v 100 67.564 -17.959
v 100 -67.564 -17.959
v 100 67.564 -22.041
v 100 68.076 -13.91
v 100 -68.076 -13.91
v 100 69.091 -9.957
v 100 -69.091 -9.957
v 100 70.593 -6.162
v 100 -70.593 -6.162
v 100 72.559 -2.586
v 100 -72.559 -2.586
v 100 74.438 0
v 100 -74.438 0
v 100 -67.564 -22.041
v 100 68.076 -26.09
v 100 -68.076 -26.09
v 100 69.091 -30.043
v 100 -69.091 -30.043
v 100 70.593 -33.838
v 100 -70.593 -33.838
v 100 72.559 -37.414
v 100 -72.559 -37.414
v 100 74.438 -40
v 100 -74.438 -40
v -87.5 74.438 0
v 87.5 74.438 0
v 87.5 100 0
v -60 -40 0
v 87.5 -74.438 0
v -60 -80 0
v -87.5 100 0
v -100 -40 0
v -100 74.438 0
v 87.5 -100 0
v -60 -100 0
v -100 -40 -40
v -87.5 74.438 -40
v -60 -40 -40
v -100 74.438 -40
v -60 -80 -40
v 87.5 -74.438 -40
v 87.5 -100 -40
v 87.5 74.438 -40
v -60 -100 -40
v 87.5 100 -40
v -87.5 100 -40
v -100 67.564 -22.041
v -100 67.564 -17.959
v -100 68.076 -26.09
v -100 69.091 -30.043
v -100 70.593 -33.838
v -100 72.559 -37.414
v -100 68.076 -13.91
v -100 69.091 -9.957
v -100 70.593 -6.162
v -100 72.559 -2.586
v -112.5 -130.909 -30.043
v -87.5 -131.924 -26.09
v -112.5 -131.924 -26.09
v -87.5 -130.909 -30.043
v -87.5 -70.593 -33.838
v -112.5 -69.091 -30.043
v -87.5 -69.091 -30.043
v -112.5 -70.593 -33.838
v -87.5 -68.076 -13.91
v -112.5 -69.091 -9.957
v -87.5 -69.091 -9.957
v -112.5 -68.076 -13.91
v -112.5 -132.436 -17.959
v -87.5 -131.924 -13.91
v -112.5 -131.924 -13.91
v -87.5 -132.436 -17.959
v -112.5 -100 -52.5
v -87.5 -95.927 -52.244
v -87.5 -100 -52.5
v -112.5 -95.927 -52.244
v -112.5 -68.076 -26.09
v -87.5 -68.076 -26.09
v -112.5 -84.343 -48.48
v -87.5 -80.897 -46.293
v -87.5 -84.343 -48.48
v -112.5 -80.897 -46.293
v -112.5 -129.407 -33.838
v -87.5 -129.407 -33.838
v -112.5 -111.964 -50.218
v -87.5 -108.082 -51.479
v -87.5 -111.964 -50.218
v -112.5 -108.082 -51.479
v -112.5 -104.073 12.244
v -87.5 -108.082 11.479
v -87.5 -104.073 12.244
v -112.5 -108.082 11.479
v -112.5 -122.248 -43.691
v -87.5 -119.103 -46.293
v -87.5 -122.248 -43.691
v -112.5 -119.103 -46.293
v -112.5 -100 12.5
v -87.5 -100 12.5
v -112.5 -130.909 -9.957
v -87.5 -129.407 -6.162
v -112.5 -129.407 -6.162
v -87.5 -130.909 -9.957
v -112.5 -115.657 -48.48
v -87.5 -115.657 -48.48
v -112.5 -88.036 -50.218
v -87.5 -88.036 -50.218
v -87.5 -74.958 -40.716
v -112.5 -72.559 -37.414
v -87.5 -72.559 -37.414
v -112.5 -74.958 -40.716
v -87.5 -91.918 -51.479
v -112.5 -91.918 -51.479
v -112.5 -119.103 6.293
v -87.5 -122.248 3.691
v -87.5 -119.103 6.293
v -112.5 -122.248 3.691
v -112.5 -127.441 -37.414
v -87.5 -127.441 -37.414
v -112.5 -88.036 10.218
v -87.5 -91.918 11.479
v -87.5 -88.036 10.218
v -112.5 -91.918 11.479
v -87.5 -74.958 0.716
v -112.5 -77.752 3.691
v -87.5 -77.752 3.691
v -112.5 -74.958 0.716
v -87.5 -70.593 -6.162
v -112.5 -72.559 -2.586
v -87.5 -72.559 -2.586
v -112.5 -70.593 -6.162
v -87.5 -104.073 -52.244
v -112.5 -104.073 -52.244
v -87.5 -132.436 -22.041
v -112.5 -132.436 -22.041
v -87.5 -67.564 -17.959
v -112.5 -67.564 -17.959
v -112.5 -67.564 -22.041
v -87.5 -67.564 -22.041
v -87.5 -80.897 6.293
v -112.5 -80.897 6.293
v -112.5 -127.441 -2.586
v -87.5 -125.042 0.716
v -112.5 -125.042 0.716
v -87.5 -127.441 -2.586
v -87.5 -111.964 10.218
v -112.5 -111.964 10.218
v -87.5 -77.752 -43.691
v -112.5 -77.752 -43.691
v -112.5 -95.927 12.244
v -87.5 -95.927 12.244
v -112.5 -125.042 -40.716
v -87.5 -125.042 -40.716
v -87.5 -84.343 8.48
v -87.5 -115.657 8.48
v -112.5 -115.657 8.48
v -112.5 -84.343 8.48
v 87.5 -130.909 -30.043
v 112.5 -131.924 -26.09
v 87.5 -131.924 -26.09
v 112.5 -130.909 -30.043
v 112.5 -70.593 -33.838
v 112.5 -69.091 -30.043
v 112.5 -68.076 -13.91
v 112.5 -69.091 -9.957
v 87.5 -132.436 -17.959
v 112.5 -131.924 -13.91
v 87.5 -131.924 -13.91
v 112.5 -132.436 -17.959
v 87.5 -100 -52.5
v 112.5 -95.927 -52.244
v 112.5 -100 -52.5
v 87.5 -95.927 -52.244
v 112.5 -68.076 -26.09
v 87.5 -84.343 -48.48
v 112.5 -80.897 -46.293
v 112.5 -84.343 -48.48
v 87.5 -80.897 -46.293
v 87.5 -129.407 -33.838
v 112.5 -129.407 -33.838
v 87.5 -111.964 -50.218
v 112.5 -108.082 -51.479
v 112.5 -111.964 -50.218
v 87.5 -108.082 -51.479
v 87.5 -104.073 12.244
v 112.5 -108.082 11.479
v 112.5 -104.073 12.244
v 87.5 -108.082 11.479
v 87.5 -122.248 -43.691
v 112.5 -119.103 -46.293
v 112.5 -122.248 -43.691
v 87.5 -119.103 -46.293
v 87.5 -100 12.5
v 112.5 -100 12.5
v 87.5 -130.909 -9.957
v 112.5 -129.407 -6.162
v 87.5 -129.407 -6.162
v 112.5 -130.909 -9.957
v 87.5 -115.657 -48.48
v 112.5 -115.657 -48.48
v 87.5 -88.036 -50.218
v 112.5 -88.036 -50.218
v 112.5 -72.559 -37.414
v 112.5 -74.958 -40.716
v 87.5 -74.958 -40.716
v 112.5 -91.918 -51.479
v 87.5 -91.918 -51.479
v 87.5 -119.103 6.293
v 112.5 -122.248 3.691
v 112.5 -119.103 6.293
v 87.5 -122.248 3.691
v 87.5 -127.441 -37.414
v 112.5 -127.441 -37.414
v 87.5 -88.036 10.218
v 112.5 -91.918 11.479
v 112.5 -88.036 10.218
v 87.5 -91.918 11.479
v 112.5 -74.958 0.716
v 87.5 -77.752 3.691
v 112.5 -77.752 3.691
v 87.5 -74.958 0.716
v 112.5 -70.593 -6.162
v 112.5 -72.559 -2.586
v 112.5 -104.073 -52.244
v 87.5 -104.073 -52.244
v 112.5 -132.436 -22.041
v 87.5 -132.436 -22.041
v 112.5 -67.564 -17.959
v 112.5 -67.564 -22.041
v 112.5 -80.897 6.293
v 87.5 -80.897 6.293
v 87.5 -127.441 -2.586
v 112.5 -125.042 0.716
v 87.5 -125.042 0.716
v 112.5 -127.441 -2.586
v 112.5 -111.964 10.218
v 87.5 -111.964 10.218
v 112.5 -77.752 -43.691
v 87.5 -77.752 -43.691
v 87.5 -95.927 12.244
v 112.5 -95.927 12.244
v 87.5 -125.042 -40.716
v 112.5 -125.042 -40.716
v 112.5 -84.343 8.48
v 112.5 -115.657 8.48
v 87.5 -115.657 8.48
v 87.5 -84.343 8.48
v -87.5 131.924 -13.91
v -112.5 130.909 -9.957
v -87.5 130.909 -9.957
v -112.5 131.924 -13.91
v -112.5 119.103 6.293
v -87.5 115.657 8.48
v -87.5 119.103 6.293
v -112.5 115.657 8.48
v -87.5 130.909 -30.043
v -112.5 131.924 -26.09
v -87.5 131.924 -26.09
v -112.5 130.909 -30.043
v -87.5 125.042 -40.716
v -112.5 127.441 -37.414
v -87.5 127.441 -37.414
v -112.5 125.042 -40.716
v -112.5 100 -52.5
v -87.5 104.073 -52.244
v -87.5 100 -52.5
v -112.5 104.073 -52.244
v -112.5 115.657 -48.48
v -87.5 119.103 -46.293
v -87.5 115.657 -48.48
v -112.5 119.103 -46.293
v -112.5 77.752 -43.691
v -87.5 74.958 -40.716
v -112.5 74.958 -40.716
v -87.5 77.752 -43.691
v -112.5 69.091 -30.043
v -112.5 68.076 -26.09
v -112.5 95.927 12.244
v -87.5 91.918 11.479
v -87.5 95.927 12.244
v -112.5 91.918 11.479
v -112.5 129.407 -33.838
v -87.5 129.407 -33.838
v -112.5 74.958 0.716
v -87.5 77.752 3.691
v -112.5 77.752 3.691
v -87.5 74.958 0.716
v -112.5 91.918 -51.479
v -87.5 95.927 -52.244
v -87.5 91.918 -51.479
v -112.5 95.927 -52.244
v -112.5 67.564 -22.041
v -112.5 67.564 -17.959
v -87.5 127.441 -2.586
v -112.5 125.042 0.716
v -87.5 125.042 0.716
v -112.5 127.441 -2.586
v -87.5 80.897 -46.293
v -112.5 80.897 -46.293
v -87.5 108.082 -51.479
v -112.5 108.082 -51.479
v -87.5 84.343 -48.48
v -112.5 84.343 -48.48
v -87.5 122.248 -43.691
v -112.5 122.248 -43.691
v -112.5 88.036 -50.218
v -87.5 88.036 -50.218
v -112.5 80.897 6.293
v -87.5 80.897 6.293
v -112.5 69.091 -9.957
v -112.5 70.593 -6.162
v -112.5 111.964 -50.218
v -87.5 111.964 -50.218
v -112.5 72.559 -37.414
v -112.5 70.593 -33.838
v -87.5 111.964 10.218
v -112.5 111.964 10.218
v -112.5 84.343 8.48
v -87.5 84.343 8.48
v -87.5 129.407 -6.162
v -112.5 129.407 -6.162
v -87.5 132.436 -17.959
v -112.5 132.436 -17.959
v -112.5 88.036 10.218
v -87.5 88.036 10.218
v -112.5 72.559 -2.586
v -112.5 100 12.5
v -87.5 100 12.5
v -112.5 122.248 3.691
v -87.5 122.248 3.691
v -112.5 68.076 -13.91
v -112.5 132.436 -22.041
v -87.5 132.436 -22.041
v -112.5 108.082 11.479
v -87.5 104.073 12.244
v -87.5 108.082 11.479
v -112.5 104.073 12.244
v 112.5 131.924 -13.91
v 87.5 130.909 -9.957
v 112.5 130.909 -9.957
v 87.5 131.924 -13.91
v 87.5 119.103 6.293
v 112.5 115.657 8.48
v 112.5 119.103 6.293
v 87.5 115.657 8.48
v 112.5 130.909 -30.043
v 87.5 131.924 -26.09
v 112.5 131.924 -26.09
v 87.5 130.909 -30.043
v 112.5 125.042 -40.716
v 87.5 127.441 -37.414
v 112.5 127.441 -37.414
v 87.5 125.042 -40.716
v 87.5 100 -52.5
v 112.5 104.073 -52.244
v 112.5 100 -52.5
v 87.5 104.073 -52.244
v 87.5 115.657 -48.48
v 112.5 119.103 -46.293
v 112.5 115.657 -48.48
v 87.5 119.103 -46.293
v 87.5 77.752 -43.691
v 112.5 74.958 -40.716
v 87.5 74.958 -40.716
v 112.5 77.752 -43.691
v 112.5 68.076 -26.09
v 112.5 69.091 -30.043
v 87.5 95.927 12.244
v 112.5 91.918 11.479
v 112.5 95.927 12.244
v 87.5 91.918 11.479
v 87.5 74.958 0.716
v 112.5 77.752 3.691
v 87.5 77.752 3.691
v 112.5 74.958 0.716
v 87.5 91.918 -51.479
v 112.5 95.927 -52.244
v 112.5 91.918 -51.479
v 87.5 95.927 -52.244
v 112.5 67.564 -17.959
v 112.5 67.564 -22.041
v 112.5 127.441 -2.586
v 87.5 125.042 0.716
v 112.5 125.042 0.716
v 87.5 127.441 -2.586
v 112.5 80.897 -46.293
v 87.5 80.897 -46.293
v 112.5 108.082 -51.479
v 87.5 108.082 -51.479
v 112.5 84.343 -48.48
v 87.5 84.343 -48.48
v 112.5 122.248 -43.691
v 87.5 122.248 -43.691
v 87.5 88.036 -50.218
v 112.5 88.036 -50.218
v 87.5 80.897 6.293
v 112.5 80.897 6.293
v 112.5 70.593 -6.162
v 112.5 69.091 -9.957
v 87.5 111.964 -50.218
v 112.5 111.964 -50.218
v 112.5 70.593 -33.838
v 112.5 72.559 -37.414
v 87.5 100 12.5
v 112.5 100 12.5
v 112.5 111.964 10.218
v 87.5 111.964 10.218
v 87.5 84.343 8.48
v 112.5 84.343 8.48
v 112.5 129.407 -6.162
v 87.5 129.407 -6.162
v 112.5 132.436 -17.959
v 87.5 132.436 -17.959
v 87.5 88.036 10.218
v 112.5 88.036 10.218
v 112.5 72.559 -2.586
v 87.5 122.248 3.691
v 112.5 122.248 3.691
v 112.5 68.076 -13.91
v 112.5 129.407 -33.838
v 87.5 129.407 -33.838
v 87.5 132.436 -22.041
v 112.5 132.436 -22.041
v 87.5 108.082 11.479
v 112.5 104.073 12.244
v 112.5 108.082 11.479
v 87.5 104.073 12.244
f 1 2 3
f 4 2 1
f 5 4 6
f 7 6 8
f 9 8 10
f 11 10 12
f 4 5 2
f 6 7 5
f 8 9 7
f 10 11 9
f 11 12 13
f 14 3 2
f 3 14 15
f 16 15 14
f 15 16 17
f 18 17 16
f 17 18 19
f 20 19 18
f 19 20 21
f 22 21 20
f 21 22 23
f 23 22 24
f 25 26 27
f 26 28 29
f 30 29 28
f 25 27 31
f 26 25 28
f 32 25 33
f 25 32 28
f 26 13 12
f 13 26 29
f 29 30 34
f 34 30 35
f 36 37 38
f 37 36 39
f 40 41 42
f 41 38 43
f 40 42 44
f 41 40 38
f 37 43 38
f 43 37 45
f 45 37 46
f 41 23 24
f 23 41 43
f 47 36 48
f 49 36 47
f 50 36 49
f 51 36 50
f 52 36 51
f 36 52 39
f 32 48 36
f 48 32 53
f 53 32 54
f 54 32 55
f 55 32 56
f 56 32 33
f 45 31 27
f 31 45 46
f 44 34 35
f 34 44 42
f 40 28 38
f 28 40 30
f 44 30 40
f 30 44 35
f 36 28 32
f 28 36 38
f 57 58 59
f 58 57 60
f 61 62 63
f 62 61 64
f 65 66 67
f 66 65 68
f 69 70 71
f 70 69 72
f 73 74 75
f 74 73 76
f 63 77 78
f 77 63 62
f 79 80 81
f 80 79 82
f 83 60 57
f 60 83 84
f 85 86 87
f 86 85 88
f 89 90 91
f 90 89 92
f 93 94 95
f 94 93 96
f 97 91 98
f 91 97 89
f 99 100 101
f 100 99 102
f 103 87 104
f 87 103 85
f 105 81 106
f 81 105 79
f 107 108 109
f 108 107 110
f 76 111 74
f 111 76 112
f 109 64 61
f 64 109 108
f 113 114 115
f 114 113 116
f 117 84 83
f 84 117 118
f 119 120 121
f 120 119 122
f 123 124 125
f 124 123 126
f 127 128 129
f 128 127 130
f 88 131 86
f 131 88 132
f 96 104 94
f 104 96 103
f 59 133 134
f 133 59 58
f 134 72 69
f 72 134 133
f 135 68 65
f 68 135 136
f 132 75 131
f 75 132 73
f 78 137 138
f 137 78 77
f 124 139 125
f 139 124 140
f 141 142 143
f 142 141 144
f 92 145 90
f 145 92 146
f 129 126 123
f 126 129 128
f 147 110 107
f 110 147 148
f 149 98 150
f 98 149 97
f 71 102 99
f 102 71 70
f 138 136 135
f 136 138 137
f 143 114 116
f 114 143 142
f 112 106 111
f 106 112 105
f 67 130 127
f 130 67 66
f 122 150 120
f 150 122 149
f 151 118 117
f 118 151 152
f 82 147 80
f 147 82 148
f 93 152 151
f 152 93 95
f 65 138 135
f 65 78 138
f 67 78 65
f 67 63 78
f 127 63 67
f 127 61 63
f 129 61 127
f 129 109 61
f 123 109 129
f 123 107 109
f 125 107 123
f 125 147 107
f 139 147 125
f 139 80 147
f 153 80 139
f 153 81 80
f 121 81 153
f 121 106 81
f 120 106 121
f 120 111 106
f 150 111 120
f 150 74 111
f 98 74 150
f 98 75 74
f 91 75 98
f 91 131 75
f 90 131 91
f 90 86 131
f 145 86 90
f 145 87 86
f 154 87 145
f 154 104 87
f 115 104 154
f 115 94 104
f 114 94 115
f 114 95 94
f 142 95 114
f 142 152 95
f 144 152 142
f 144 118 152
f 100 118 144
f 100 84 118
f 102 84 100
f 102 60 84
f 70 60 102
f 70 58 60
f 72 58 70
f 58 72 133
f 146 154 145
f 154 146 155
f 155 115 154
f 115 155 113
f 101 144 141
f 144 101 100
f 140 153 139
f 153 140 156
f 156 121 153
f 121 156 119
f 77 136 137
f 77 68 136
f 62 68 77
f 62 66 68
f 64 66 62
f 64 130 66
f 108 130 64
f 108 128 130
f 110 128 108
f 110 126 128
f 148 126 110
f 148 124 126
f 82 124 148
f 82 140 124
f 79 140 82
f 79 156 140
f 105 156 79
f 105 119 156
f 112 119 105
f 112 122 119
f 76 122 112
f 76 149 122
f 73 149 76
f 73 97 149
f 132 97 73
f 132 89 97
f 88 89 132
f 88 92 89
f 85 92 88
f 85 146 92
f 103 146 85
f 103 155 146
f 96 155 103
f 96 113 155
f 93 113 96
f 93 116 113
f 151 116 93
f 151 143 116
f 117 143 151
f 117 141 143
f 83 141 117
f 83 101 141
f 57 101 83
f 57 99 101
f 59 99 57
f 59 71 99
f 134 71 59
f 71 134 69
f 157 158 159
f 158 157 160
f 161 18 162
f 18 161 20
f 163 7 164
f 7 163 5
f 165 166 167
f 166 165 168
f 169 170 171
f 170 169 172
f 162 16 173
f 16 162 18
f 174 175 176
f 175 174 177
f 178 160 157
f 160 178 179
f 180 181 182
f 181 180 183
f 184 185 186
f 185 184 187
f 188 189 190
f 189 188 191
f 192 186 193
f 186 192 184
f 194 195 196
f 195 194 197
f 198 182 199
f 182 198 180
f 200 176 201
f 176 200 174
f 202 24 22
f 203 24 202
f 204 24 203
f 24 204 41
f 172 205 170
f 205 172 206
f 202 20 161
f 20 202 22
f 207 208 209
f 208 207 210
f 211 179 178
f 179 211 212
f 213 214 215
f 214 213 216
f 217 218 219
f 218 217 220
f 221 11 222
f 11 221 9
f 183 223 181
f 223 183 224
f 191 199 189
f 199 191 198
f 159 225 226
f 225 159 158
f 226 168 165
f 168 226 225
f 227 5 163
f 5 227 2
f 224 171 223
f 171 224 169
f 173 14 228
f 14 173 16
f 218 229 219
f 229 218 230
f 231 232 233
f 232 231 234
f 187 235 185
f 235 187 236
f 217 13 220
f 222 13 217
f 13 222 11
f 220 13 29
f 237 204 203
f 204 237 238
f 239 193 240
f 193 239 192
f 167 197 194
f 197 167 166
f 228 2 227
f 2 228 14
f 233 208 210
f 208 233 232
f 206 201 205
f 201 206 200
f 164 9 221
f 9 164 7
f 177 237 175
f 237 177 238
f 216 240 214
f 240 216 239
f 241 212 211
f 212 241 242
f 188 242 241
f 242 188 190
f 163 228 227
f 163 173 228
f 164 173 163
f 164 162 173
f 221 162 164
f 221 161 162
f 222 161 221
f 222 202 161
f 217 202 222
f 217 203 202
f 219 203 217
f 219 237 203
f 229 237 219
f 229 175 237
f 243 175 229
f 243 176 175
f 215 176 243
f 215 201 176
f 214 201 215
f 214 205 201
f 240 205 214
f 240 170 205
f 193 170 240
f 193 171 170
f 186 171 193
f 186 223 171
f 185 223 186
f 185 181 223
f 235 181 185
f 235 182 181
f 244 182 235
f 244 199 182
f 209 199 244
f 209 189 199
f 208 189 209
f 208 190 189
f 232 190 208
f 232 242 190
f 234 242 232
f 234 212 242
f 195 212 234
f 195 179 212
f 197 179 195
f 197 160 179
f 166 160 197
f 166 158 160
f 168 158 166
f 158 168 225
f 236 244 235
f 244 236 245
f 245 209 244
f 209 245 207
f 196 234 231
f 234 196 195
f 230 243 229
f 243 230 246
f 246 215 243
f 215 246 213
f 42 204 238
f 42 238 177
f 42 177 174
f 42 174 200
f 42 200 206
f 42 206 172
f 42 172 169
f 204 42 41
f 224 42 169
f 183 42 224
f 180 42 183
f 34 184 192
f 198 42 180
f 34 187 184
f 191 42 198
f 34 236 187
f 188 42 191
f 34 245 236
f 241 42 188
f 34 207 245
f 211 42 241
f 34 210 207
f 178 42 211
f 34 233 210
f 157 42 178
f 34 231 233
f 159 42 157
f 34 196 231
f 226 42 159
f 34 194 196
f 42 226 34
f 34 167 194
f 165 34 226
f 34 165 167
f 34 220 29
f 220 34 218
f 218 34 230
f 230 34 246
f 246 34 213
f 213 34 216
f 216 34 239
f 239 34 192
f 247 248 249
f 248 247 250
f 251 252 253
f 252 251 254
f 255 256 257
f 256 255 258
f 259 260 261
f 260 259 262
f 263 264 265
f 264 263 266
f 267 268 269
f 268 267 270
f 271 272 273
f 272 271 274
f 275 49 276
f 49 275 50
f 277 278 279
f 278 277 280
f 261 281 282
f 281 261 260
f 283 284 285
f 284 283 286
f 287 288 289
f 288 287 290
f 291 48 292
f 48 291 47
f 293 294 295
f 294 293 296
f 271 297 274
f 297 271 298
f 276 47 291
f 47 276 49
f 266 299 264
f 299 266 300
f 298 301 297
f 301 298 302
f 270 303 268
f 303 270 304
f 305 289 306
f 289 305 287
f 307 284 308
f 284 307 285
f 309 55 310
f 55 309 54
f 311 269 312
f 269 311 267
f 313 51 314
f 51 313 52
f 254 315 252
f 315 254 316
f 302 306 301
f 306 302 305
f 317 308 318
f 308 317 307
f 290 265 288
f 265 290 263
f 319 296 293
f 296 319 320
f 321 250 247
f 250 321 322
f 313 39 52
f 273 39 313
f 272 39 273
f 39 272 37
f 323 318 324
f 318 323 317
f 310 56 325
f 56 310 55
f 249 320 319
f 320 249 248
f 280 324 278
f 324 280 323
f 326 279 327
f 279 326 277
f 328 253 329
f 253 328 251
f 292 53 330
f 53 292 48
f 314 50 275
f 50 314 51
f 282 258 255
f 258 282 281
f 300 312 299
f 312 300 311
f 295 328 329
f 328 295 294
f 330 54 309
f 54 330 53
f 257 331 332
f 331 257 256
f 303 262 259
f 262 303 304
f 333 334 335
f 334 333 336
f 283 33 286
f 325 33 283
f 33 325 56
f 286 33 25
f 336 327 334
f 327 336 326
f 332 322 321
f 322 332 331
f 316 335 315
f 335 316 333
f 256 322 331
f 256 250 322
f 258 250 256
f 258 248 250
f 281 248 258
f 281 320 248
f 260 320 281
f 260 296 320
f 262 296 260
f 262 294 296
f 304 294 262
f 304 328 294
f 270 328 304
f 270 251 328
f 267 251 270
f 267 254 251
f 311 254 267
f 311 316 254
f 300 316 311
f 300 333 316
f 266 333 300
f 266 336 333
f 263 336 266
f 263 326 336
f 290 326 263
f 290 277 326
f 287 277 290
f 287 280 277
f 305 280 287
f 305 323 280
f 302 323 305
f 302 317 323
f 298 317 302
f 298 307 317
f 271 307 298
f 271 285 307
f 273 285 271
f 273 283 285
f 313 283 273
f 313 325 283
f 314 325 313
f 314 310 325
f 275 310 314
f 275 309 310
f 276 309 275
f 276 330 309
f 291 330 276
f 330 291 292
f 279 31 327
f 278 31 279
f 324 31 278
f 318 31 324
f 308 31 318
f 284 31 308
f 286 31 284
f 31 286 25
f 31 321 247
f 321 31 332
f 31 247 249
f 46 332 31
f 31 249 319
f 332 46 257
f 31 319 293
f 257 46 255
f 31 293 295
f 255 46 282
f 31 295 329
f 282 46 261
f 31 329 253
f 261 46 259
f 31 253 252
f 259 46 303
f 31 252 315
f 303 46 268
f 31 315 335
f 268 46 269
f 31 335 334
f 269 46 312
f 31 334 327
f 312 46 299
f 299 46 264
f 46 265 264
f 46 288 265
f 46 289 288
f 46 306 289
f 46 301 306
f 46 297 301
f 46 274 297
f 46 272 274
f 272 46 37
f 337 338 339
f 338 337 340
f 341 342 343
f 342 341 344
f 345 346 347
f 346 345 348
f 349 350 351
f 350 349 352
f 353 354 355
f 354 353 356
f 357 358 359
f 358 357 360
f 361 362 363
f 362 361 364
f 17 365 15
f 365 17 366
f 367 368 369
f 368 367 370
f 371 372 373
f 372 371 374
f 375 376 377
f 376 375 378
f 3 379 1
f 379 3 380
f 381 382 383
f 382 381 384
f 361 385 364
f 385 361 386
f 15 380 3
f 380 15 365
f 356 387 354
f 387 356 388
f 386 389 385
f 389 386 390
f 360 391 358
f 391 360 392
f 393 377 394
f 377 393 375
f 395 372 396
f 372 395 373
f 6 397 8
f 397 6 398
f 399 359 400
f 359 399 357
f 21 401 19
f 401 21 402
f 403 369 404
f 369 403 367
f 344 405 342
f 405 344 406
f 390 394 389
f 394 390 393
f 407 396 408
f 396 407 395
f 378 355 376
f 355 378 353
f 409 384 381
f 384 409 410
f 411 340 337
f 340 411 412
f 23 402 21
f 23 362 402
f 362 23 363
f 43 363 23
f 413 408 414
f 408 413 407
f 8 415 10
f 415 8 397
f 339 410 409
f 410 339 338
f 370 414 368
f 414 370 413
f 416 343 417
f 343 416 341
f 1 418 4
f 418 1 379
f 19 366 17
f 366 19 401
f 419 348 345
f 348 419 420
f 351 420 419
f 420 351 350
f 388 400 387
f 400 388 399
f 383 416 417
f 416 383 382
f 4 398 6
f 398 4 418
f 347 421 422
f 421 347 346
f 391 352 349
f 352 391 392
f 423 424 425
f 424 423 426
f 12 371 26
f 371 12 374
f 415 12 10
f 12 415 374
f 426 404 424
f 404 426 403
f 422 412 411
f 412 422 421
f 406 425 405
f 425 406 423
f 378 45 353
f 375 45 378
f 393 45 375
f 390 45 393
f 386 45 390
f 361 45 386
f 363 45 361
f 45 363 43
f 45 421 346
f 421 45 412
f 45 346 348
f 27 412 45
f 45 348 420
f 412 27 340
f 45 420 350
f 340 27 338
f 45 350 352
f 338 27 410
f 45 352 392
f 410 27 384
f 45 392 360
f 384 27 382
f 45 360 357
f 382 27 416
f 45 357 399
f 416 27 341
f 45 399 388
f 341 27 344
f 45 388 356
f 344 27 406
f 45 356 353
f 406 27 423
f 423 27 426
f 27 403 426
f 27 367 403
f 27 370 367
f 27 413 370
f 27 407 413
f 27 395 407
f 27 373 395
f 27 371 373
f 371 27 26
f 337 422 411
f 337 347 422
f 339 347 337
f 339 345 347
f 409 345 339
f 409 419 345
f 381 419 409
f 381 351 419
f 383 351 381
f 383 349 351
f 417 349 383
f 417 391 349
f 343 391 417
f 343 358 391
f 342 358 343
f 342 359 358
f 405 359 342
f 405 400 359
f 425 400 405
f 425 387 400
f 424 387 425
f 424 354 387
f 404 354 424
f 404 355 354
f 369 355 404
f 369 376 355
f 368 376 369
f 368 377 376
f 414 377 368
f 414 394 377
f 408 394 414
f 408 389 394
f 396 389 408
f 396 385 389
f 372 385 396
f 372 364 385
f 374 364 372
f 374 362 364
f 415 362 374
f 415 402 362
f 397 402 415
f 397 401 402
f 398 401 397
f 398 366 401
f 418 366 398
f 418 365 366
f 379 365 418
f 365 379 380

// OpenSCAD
module wheel(){
    rotate([0,90,0])cylinder(25, r=65/2,center=true,$fn=50);
}
module notprint_wheel(){
    translate([-100,-100,-20])wheel();
    translate([ 100,-100,-20])wheel();
    translate([-100, 100,-20])wheel();
    translate([ 100, 100,-20])wheel();
}

module battone(){
    cube([40,80,40],center=true);
}
module notprint_batt(){
    translate([-40, 40,-20])battone();
    translate([  0, 40,-20])battone();
    translate([ 40, 40,-20])battone();
    translate([-40,-40,-20])battone();
    translate([  0,-40,-20])battone();
    translate([ 40,-40,-20])battone();
}

module boardone(){
    difference(){
        cube([200,200,40],center=true);
        cube([120,160,50],center=true);
        translate([-80,-70,0])cube([40,60,50],center=true);
    }
}
module board(){
    translate([0,0,-20])boardone();
}


/*
color("#ffff00")translate([0,0,80])cube([2,200,0.00000001],center=true);
color("#ffff00")translate([0,0,80])cube([200,2,0.00000001],center=true);

color("#ff00ff")translate([0,0,40])cube([2,200,0.00000001],center=true);
color("#ff00ff")translate([0,0,40])cube([200,2,0.00000001],center=true);

color("#ff00ff")cube([2,200,0.00000001],center=true);
color("#ff00ff")cube([200,2,0.00000001],center=true);

color("#ffff00")translate([0,0,-40])cube([2,200,0.00000001],center=true);
color("#ffff00")translate([0,0,-40])cube([200,2,0.00000001],center=true);
*/


//--------for preview--------
board();
notprint_batt();
notprint_wheel();


//--------for print--------


//--------for test--------


//--------for delete--------
